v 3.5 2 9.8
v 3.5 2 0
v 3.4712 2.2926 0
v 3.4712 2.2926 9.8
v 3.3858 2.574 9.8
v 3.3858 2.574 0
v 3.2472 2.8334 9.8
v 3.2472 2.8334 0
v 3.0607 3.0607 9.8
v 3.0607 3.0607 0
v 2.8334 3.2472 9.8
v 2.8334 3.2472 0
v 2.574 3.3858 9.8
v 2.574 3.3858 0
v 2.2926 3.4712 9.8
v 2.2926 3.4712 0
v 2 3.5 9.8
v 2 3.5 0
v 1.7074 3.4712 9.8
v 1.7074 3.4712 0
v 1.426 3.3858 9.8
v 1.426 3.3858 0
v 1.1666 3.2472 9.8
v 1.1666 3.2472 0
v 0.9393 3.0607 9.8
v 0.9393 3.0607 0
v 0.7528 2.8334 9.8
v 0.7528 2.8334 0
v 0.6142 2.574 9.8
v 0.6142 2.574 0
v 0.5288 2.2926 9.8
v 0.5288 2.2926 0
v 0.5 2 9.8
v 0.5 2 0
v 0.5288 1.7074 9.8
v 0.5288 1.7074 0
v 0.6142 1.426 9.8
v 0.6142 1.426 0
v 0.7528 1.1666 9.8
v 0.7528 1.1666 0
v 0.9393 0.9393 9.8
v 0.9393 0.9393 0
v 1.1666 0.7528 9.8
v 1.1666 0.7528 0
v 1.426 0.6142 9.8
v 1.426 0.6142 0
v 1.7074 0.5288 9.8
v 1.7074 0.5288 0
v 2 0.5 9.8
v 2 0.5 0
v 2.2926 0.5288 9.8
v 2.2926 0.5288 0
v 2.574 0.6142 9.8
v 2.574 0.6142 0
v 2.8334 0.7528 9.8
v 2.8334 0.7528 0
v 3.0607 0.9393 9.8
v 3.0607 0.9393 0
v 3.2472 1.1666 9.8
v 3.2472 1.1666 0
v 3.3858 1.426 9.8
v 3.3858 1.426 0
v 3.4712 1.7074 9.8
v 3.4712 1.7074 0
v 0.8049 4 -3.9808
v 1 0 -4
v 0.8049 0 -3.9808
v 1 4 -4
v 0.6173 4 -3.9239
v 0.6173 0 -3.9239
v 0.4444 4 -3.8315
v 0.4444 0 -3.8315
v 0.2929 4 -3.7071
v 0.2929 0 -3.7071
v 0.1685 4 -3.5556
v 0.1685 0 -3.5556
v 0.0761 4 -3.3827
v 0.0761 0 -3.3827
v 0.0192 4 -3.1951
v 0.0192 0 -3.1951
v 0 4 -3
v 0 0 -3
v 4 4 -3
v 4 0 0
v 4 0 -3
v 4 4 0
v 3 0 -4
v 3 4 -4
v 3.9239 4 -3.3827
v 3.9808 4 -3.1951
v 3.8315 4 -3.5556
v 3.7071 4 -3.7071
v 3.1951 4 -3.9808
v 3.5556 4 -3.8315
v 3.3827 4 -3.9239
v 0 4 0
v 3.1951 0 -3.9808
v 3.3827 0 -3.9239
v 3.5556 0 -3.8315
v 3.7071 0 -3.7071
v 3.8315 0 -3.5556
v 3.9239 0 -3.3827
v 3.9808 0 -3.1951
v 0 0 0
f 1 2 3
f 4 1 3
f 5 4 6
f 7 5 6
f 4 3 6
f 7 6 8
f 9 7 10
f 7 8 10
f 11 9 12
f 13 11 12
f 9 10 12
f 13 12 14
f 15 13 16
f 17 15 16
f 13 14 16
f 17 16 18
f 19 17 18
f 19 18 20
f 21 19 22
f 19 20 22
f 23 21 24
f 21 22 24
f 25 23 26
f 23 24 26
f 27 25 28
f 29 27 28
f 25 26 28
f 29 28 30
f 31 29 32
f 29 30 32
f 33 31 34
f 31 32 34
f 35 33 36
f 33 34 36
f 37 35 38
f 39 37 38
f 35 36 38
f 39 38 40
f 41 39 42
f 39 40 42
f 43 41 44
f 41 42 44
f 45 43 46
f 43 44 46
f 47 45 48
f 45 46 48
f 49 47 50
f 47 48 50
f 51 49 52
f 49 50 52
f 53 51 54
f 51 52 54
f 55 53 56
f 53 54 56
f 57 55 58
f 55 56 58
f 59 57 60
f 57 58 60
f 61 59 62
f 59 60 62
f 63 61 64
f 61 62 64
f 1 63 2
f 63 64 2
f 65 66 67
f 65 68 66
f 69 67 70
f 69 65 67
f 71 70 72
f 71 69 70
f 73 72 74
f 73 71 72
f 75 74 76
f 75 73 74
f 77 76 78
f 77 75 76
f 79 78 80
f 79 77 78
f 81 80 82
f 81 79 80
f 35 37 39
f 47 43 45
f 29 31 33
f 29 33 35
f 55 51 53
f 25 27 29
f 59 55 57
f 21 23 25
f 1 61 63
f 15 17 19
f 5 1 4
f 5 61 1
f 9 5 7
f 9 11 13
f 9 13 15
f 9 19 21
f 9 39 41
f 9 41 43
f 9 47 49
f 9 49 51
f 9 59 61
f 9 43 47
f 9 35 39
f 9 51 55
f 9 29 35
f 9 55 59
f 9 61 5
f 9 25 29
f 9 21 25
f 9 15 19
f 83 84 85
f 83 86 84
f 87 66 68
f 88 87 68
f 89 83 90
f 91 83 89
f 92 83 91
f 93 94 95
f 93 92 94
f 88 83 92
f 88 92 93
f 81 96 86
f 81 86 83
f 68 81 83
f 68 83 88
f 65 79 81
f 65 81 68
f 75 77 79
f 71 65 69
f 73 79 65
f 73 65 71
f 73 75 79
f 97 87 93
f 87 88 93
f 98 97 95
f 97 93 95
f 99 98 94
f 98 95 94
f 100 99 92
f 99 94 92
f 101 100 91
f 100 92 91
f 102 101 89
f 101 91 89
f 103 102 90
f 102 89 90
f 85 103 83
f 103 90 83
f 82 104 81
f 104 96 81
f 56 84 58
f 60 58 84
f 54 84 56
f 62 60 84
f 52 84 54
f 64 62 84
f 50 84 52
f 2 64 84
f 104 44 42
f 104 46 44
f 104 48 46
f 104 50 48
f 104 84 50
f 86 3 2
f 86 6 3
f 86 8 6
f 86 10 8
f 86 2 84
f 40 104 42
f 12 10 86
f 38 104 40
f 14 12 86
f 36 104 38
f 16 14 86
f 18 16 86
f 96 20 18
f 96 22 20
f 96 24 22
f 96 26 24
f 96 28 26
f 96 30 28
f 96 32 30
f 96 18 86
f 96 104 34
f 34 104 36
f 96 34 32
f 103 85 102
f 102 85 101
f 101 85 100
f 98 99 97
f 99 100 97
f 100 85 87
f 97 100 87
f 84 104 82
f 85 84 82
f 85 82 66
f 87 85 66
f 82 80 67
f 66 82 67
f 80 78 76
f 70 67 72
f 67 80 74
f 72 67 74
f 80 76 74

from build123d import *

# Parameters (mm, degrees)
SKETCH2_W           = 4
SKETCH2_H           = 4
BOSS_EXTRUDE1_DEPTH = 4
FILLET1_R           = 1
SKETCH3_R           = 1.5
BOSS_EXTRUDE2_DEPTH = 9.8


with BuildPart() as part:
    # Sketch2 → Boss-Extrude1 (new body)
    with BuildSketch(Plane(origin=(0, 0, 0), x_dir=(0, 0, -1), z_dir=(1, 0, 0))):
        with Locations((2, 2)):
            Rectangle(SKETCH2_W, SKETCH2_H)
    extrude(amount=BOSS_EXTRUDE1_DEPTH)

    # Fillet1
    fillet1_edges = [part.edges().sort_by_distance(p)[0] for p in [
        (4, 2, -4),
        (0, 2, -4),
    ]]
    fillet(fillet1_edges, radius=FILLET1_R)

    # Sketch3 → Boss-Extrude2 (add)
    with BuildSketch(Plane.XY):
        with Locations((2, 2)):
            Circle(SKETCH3_R)
    extrude(amount=BOSS_EXTRUDE2_DEPTH)


solid = part.part
